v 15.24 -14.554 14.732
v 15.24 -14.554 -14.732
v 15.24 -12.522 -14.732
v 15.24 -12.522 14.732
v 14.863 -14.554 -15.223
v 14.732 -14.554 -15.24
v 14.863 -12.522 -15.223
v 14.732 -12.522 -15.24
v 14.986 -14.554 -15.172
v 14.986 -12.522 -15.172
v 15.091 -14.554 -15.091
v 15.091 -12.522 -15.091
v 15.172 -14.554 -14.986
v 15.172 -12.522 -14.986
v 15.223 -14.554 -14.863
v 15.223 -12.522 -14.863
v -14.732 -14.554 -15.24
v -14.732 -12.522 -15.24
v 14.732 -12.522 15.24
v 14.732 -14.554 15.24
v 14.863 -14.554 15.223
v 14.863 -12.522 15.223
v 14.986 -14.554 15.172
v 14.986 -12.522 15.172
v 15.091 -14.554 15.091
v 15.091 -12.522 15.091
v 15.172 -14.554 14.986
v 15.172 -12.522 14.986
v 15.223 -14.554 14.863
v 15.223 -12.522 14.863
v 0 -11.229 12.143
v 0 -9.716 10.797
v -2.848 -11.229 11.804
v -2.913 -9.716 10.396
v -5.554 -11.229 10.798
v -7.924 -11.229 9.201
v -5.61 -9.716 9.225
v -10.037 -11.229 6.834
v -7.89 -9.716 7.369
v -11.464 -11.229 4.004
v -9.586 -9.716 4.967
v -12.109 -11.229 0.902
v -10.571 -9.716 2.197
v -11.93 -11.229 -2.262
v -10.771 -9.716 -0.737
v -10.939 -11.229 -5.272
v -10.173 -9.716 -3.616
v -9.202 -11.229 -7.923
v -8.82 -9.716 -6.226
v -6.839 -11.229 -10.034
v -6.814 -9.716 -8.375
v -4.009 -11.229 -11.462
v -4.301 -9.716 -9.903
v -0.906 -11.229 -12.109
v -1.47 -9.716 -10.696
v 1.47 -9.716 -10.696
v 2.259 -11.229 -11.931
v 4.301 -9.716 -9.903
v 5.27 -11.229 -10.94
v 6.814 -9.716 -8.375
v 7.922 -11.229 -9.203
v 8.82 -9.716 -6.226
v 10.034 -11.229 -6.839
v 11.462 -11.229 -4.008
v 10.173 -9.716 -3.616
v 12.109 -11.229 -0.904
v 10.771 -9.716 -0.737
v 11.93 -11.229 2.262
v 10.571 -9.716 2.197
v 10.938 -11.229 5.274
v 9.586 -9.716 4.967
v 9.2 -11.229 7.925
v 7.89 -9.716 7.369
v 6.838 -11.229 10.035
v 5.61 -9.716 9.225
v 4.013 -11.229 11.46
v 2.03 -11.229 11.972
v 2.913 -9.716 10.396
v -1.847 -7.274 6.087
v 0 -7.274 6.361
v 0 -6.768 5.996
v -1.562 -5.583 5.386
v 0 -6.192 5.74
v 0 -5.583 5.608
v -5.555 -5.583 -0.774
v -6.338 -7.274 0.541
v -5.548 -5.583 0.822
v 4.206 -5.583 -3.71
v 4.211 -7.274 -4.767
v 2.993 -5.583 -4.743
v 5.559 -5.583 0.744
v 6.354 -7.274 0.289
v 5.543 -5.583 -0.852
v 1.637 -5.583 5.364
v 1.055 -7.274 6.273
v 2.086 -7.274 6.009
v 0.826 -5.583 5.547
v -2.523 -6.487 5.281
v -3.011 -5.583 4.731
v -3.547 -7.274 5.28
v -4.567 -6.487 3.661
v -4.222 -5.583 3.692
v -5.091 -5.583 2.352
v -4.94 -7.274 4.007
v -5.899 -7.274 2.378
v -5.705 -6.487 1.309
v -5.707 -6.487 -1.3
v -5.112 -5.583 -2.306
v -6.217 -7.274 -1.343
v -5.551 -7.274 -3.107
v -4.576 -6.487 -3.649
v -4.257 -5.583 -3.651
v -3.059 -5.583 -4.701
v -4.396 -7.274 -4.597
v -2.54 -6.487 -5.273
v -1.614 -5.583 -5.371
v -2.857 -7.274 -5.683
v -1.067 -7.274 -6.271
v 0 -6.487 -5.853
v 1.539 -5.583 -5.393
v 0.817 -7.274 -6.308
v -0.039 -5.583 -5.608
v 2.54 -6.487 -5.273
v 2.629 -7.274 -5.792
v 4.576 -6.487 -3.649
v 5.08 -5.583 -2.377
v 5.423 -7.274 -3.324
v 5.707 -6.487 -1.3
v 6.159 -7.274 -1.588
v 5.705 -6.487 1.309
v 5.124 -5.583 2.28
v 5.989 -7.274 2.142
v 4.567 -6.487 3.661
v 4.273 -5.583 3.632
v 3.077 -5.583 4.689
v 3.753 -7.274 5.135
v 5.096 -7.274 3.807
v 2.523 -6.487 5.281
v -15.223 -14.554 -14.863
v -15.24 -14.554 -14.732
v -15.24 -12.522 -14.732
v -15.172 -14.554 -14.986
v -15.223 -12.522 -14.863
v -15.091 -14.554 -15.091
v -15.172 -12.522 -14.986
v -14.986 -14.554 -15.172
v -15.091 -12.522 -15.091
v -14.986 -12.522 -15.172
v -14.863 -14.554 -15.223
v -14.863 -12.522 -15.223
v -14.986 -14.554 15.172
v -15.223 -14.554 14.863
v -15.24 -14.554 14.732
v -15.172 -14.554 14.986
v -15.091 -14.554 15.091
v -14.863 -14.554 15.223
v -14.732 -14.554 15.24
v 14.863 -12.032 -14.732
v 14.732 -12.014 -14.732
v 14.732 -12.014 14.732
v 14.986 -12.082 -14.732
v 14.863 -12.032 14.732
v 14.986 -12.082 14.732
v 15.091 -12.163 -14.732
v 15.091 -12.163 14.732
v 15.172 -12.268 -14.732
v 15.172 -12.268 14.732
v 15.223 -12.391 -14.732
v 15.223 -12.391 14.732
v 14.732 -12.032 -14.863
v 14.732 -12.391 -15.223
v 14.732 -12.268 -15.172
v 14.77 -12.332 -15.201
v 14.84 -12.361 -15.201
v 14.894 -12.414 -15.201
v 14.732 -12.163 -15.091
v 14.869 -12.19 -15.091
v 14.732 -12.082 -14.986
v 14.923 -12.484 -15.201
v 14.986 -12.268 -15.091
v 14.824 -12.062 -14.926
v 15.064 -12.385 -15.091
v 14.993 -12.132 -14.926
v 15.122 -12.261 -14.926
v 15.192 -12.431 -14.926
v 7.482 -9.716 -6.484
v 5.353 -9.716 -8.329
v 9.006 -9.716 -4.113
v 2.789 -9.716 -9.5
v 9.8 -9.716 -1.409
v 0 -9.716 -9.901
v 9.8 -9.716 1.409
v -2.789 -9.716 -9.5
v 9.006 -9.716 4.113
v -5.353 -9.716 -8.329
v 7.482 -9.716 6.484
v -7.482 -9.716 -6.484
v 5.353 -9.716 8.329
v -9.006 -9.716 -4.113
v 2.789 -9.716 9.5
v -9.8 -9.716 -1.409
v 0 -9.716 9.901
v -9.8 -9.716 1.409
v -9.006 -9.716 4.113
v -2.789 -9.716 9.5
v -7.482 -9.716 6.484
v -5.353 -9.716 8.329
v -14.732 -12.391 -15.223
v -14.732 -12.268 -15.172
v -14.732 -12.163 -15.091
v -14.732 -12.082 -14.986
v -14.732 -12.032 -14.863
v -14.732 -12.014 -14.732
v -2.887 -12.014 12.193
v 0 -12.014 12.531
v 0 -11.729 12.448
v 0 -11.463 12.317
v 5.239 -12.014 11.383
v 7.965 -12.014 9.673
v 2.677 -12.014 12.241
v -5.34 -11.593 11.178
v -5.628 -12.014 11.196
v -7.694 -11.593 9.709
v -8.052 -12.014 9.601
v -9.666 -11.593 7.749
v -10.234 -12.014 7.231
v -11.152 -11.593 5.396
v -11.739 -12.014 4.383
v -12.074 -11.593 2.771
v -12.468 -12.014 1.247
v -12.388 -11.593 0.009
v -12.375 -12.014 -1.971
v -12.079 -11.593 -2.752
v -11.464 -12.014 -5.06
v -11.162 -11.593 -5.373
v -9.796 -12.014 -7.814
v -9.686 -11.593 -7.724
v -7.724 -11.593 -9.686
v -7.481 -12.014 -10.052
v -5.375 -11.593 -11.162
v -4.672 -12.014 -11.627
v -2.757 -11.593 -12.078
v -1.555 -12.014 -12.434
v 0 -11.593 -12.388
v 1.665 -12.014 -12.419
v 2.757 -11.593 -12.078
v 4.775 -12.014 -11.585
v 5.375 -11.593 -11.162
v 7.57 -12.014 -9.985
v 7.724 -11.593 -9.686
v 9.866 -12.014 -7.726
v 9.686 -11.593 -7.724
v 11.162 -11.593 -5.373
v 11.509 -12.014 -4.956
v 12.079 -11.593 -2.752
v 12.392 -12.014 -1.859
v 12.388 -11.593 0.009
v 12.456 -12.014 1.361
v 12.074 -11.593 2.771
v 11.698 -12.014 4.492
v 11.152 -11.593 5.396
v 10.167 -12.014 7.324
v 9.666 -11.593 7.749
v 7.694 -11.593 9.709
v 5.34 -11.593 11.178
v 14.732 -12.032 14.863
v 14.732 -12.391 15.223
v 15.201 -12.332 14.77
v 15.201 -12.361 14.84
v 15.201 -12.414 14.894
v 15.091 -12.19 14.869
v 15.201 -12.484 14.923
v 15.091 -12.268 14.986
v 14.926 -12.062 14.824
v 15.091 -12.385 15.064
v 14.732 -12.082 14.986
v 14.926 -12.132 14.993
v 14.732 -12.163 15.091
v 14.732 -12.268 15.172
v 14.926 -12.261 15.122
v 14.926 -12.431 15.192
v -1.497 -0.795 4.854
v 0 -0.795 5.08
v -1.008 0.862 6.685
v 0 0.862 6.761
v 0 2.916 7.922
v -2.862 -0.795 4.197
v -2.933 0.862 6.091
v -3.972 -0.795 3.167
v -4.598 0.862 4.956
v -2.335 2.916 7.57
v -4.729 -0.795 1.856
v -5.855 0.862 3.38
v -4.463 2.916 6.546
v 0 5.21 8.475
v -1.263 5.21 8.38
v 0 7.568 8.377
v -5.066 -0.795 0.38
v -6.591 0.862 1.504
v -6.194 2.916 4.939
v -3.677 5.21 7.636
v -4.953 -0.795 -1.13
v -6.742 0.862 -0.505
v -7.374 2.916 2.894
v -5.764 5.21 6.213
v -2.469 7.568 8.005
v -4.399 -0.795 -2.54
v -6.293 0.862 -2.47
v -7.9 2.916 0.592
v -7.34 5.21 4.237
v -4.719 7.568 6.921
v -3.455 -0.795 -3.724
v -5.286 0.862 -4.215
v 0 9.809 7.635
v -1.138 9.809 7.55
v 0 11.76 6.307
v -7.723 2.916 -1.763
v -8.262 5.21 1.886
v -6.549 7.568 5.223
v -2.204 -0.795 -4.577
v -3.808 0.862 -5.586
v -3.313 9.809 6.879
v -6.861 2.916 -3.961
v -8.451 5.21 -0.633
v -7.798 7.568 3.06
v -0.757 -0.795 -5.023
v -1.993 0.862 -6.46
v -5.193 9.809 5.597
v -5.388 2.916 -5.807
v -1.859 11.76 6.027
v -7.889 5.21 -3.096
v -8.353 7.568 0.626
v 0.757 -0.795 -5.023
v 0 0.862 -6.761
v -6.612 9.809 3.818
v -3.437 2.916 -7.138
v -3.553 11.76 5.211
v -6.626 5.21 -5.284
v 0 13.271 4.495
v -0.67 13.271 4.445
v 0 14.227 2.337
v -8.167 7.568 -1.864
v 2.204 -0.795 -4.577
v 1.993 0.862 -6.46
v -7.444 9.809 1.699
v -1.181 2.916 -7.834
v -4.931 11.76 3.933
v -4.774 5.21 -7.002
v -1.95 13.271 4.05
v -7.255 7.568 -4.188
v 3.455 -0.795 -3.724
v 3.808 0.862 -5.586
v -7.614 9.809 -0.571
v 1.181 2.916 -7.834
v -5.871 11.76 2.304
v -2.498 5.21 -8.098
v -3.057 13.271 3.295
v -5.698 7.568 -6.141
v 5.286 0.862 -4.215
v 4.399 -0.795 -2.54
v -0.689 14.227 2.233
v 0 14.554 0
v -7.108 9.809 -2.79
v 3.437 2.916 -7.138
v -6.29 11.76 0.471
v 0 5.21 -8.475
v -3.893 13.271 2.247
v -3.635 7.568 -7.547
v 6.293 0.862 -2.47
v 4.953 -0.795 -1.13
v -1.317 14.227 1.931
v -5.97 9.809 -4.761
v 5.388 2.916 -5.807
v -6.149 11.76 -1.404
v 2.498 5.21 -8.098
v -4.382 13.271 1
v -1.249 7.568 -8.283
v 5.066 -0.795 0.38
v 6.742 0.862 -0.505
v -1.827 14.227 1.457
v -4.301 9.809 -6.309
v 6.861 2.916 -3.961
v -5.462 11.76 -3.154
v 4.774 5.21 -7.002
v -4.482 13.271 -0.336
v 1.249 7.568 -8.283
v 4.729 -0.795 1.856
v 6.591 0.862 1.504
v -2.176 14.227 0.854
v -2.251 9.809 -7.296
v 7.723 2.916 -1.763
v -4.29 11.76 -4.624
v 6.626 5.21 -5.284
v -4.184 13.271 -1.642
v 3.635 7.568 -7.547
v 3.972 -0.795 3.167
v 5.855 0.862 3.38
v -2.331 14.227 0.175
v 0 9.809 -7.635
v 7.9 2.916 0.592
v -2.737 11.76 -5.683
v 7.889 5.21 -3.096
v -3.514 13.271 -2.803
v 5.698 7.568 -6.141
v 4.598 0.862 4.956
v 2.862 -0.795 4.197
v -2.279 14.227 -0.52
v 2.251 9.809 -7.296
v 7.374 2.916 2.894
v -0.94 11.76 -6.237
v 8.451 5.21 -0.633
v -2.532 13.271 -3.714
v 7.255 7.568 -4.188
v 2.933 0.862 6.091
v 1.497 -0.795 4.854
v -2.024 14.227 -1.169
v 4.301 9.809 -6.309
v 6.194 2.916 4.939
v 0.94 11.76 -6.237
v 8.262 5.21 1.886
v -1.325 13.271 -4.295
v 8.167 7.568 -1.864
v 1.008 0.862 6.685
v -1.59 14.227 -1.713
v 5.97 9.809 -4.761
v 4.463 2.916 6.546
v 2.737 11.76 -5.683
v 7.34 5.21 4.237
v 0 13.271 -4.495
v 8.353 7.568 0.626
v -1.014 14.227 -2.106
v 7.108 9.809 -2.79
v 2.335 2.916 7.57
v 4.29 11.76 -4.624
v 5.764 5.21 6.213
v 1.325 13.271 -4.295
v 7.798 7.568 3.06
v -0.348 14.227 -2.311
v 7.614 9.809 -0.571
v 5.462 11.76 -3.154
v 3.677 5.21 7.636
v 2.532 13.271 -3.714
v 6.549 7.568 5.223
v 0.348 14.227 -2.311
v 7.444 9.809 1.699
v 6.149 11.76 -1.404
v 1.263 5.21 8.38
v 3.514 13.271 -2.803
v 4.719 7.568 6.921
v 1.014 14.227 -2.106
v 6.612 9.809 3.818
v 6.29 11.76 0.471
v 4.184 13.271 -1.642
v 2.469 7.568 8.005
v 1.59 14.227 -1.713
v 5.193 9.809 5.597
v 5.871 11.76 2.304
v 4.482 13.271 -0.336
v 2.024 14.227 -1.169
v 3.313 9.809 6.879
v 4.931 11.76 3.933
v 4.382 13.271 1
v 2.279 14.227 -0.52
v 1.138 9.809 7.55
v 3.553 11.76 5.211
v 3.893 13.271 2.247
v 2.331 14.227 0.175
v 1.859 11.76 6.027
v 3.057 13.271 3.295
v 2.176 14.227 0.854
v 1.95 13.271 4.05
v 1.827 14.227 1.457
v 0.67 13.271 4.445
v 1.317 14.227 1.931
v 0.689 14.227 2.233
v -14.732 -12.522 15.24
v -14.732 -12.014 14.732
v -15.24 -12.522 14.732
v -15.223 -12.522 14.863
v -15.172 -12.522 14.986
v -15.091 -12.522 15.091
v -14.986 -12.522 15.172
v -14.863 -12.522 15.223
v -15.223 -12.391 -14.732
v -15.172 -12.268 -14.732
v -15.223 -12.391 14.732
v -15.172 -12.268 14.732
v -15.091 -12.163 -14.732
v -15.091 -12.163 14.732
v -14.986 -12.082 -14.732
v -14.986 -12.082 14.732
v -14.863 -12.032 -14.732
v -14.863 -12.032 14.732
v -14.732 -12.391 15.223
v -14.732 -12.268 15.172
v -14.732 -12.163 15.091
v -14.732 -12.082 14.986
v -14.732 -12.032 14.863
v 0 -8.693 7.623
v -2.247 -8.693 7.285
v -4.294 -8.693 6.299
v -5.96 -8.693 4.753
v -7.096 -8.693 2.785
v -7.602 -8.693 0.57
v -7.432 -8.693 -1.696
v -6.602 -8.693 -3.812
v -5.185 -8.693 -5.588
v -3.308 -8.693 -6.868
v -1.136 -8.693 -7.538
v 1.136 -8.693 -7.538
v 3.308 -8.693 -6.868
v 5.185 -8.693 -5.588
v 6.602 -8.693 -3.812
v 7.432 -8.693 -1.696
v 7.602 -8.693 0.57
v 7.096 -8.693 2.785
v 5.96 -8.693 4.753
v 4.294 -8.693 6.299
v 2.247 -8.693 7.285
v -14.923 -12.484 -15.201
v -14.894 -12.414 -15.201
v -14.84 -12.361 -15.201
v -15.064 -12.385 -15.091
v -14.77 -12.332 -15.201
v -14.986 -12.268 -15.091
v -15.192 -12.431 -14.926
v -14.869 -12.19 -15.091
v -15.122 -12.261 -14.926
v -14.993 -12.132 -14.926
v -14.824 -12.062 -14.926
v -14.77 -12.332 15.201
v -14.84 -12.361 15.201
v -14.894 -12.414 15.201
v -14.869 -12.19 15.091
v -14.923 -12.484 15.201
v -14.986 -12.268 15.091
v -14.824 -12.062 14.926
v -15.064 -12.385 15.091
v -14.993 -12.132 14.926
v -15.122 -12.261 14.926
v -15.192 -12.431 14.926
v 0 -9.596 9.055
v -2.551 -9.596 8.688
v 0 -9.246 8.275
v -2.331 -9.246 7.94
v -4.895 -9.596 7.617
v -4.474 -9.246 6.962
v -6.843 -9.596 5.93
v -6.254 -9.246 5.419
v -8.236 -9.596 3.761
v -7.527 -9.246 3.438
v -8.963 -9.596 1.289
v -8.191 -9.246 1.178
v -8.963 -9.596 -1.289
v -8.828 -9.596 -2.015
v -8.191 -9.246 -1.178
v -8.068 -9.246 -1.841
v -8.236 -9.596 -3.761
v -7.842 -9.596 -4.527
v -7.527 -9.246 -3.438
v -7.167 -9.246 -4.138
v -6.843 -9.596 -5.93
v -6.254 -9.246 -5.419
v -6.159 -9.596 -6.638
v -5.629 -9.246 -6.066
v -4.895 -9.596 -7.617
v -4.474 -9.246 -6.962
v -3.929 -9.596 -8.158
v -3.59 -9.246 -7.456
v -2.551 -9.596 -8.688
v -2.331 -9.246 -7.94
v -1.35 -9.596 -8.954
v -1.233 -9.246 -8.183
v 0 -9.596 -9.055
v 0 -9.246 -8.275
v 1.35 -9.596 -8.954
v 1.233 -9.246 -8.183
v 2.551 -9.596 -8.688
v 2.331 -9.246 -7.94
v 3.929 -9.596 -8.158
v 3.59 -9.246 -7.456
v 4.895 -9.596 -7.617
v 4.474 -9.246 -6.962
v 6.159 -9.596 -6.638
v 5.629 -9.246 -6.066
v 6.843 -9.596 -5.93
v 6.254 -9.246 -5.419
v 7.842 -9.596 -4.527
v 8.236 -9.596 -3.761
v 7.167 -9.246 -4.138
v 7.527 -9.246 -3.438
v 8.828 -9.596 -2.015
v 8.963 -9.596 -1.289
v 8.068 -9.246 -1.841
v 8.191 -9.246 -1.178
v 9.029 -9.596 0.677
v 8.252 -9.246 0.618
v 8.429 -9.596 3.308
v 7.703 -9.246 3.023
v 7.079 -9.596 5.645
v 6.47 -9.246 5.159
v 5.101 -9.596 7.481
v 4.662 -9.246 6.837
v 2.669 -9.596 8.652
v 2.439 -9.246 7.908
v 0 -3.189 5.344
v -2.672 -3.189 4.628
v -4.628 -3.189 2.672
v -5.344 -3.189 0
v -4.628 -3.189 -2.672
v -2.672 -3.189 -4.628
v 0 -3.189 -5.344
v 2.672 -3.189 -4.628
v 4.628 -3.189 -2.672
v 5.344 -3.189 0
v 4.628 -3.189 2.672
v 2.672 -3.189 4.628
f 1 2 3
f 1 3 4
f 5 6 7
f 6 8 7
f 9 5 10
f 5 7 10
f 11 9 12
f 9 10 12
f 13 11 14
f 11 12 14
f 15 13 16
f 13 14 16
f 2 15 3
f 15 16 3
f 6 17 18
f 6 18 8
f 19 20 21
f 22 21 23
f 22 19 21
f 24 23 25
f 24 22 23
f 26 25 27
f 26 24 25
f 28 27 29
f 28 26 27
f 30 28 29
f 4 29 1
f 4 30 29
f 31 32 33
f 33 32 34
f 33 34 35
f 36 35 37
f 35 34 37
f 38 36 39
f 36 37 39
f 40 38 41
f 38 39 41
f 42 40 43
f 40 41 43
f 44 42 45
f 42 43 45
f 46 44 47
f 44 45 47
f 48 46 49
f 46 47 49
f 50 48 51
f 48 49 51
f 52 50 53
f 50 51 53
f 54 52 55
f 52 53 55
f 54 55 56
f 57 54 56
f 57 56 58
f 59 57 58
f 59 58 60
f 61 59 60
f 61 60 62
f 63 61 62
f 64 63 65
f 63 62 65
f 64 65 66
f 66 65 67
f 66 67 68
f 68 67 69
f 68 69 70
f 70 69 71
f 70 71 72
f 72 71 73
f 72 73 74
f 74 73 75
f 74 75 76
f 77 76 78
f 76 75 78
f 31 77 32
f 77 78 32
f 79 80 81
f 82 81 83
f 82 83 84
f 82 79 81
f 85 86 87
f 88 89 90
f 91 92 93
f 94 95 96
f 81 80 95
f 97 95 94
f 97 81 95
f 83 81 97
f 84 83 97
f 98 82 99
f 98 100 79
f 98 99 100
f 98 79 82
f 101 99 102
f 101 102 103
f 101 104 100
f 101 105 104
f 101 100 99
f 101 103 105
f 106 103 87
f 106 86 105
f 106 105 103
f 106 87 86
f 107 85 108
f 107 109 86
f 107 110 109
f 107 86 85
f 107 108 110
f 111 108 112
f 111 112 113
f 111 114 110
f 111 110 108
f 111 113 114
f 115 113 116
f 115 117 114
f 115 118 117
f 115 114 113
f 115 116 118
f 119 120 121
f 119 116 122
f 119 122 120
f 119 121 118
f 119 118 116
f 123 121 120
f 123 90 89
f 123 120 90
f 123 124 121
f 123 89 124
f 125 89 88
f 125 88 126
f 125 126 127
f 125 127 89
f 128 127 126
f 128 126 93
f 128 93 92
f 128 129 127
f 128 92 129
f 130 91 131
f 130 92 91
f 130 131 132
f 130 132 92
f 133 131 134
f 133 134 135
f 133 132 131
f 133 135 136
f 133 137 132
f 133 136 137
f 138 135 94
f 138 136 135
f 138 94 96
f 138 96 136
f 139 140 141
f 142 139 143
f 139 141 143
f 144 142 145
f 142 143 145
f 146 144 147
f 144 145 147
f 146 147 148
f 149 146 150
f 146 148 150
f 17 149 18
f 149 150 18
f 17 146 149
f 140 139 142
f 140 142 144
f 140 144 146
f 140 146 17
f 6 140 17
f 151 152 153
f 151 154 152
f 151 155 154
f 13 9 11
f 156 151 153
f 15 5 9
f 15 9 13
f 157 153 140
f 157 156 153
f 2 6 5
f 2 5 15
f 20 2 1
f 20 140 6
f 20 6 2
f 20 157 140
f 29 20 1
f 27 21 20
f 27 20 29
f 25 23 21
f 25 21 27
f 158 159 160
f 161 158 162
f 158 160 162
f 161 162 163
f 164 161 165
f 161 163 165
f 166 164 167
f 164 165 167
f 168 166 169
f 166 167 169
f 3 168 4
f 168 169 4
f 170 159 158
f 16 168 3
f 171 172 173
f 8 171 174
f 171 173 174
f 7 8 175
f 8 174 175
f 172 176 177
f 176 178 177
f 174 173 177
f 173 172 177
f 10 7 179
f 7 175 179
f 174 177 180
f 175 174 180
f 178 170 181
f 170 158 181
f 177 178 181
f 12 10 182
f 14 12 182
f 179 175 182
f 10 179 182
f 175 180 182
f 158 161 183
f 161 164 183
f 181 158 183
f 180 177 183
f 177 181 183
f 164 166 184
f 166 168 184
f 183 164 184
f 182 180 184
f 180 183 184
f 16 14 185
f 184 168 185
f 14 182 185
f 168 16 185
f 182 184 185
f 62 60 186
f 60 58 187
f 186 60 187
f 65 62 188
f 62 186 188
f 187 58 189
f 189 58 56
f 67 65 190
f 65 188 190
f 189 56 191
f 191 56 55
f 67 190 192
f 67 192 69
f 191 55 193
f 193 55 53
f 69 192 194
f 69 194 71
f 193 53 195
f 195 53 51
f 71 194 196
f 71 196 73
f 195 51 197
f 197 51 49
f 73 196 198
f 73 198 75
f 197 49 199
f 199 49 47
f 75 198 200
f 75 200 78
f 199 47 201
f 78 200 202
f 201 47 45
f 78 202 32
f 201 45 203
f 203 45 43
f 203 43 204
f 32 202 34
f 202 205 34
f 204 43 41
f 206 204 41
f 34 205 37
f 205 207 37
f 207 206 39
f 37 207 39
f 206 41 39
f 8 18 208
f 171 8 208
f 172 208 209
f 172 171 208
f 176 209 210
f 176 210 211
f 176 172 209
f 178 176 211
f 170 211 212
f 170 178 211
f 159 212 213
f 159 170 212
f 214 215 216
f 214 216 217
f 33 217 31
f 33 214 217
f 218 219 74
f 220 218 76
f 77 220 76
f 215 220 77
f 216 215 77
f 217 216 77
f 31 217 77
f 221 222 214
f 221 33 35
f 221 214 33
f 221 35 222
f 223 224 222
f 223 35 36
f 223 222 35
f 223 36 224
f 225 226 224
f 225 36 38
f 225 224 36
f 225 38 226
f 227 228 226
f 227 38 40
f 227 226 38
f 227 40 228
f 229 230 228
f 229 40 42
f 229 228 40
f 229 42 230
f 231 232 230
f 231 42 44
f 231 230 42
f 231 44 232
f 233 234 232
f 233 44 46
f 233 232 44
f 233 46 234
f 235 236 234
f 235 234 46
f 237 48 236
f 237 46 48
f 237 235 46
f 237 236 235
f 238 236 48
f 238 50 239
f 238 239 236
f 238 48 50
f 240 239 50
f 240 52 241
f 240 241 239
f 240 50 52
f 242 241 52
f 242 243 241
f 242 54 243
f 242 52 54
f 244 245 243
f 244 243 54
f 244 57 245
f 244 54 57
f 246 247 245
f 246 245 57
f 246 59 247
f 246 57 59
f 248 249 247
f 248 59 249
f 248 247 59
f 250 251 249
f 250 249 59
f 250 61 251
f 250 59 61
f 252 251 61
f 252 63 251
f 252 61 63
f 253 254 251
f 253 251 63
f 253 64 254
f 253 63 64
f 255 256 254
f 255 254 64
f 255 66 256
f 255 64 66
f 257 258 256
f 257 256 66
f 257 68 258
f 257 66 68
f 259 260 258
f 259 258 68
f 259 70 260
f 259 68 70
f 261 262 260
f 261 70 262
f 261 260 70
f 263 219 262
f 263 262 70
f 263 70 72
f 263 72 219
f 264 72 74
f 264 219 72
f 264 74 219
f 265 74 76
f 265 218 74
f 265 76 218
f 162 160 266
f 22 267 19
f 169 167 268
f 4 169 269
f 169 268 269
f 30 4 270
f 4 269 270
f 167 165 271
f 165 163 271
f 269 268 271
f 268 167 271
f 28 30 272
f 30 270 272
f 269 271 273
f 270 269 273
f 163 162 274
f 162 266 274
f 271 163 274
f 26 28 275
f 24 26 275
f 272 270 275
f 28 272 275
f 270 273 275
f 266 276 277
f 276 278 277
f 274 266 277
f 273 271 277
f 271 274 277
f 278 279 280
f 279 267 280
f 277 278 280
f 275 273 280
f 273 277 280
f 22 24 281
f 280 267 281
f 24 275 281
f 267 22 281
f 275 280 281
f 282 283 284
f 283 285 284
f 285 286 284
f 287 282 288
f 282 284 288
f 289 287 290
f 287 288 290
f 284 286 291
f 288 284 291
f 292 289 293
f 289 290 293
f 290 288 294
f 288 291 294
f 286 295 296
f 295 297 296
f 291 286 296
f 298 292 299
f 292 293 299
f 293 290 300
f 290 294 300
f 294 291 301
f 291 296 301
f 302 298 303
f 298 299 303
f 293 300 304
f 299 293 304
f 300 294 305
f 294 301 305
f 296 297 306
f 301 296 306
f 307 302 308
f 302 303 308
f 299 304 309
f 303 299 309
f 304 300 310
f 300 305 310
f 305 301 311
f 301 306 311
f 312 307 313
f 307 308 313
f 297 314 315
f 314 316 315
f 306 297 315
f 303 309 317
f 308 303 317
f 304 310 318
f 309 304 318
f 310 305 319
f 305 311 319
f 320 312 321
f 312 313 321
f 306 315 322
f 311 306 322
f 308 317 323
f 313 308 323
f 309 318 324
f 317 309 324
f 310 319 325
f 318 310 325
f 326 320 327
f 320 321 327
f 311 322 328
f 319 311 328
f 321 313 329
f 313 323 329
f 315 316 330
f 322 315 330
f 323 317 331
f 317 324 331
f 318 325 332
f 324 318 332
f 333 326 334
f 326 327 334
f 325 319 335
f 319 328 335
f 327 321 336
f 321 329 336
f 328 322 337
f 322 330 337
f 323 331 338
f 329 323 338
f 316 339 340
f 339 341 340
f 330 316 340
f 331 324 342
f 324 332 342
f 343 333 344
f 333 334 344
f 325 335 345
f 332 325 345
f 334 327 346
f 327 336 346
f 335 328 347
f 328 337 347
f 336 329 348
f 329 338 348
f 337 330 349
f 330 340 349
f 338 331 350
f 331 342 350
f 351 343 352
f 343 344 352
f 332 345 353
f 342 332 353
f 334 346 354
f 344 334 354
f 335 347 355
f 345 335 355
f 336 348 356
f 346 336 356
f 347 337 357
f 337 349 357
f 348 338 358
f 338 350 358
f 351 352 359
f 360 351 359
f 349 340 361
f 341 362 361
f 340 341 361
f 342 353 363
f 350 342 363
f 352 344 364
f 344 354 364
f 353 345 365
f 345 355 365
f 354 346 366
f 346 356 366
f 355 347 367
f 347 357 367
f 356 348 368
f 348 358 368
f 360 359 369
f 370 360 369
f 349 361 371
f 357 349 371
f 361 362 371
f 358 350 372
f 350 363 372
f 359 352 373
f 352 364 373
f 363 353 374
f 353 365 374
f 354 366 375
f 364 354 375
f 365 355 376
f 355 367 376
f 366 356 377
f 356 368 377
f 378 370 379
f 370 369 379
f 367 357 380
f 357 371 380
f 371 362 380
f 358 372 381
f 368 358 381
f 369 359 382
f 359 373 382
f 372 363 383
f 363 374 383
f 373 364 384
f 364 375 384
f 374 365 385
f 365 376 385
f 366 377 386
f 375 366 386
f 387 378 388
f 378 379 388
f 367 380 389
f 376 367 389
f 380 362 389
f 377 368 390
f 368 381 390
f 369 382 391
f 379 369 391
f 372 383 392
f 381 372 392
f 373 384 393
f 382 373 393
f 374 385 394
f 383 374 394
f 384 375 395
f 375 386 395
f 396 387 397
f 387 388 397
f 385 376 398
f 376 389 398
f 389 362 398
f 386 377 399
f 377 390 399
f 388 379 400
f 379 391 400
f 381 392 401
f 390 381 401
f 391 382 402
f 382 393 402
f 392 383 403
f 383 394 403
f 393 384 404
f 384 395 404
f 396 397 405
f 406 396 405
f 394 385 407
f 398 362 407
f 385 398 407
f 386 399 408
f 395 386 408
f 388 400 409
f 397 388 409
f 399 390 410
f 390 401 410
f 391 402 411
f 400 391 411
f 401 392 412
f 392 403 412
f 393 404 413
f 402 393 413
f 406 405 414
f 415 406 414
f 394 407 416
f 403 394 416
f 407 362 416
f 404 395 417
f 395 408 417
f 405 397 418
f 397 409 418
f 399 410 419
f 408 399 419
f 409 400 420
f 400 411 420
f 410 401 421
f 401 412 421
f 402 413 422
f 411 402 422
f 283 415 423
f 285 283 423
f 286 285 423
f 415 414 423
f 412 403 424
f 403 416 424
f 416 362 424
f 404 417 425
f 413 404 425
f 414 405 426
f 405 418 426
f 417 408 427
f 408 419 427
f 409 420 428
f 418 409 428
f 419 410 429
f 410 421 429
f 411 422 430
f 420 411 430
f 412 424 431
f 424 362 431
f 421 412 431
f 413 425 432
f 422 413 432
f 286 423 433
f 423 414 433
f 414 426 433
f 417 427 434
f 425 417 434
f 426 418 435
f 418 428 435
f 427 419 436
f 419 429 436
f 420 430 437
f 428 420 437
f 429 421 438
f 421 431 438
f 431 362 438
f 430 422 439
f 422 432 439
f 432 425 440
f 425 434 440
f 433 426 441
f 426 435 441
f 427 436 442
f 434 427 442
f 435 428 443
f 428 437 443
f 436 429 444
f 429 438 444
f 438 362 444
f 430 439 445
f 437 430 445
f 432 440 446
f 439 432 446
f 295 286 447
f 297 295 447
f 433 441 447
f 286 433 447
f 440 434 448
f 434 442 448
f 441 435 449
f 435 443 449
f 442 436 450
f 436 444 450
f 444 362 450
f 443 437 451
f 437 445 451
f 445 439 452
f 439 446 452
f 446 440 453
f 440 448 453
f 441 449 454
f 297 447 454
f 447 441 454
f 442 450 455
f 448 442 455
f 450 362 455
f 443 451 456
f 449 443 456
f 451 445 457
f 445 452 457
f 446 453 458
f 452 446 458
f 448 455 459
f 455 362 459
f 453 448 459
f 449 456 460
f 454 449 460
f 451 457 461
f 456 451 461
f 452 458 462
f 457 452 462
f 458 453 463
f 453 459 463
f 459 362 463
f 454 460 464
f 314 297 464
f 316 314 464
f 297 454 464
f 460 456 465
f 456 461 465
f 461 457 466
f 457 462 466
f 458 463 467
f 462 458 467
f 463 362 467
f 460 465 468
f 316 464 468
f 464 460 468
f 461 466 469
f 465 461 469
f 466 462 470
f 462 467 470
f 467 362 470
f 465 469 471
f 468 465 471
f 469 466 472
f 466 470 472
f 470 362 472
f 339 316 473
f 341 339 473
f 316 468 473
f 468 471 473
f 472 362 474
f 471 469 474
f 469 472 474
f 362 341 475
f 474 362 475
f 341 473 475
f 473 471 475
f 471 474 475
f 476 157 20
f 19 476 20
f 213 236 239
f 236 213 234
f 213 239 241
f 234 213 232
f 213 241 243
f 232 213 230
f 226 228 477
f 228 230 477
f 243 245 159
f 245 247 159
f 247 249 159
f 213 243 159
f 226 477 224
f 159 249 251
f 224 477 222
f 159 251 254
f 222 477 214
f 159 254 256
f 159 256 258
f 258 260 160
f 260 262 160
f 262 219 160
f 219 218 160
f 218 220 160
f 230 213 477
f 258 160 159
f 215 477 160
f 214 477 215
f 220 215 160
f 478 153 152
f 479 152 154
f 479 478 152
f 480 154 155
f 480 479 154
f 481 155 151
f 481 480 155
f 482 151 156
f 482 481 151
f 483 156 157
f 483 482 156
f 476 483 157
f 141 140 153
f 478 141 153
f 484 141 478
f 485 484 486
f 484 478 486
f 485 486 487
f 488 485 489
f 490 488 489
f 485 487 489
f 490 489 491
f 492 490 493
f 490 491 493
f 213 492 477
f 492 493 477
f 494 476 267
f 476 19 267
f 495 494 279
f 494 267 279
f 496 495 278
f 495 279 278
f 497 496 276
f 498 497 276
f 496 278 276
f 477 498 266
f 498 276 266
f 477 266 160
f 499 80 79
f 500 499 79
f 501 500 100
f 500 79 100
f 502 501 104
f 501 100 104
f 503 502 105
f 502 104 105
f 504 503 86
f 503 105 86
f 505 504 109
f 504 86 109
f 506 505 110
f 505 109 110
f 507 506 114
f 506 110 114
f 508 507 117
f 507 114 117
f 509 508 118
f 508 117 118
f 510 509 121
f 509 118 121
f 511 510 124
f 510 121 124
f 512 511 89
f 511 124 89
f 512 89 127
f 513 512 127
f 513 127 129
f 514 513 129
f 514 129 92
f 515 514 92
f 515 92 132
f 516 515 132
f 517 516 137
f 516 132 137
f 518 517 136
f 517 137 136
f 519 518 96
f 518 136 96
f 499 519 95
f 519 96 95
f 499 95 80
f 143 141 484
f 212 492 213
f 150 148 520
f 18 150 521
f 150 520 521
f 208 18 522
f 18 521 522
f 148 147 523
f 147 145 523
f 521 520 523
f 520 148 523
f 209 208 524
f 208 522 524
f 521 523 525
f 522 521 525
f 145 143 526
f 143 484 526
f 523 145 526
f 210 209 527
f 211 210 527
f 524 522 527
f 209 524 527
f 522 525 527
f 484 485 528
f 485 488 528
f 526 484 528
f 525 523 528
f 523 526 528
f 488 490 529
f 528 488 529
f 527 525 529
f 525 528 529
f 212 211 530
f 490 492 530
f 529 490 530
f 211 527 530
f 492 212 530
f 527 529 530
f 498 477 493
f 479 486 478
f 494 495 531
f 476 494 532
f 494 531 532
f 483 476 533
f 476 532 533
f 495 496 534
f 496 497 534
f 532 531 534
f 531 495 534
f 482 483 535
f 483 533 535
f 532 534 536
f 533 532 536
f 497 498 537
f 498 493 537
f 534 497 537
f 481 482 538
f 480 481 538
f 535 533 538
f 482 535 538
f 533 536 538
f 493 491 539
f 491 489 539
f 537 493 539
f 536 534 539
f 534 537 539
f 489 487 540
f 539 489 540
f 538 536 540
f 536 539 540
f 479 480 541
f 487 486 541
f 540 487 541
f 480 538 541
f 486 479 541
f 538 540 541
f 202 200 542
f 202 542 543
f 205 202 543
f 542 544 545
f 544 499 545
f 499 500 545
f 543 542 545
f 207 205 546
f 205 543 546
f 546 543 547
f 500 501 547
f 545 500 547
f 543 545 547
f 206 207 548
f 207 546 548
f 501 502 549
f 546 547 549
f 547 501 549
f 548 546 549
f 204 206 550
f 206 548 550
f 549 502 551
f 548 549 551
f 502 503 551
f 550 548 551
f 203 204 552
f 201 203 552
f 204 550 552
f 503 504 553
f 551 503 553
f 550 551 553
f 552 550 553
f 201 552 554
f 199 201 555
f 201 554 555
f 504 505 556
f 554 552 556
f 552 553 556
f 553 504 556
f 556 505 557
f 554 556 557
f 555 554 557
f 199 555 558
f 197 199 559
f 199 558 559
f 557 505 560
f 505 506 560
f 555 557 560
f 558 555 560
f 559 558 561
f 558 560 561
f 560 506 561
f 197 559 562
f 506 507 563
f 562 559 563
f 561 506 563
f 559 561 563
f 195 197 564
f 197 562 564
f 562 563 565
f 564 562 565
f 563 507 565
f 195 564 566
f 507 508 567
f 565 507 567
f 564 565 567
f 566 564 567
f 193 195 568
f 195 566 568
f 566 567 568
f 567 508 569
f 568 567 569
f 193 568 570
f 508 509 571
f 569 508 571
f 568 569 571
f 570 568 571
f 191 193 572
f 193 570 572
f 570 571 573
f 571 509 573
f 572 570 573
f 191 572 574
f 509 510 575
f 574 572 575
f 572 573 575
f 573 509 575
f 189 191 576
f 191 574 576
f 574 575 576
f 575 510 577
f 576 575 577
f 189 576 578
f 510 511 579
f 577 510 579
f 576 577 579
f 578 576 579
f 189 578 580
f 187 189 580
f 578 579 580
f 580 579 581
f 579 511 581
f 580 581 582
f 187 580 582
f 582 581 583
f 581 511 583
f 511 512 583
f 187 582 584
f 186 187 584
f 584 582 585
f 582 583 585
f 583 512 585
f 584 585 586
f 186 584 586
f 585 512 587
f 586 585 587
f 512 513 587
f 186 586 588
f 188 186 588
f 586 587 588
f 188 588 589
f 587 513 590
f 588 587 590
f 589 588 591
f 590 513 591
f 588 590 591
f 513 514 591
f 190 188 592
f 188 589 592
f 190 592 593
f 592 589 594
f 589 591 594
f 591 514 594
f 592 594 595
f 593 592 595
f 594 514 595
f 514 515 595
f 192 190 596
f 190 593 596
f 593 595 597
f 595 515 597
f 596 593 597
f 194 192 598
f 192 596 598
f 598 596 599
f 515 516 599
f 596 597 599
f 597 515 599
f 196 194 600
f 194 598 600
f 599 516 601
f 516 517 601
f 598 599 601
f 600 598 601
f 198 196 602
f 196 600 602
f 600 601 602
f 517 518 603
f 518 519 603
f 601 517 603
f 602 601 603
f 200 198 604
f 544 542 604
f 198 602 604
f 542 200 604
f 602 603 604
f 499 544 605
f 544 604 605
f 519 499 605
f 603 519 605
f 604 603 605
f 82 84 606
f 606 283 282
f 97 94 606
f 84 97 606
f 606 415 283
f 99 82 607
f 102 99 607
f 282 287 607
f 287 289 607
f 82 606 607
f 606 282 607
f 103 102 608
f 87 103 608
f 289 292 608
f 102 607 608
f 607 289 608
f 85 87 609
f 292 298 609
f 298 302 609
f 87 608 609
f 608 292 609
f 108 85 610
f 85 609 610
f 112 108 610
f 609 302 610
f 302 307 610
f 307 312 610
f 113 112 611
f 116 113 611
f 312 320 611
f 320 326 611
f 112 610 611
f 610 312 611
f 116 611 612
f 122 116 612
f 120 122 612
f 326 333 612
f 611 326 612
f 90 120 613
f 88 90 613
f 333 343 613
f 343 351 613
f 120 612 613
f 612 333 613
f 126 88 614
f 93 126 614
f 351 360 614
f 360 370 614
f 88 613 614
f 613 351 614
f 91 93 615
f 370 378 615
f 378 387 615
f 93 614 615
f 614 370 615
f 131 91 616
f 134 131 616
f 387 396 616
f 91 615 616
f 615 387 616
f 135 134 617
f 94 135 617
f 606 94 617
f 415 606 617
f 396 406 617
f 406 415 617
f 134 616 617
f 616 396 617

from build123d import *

# Parameters (mm, degrees)
FILLET1_R           = 1.651
FILLET2_R           = 3.048
SKETCH2_W           = 30.48
SKETCH2_H           = 30.48
BOSS_EXTRUDE1_DEPTH = 2.54
FILLET3_R           = 0.508


with BuildPart() as part:
    # Sketch1 → Revolve1 (revolve)
    with BuildSketch(Plane(origin=(0, 0, 0), x_dir=(0, 0, -1), z_dir=(1, 0, 0)), mode=Mode.PRIVATE) as revolve1_sk:
        with BuildLine():
            Line((0, 14.5542), (0, -14.5542))
            Line((0, -14.5542), (12.5603, -14.5542))
            Line((12.5603, -14.5542), (12.5603, -11.698058268))
            Line((12.5603, -11.698058268), (10.796510879, -9.7155))
            Line((10.796510879, -9.7155), (8.532673765, -9.7155))
            Line((8.532673765, -9.7155), (5.715, -6.548339963))
            Line((5.715, -6.548339963), (5.08, -0.795239963))
            ThreePointArc((5.08, -0.795239963), (8.084115709, 8.714342259), (0, 14.5542))
        make_face()
    revolve(revolve1_sk.sketch.rotate(Axis((0, 14.5542, 0), (0, -1, 0)), 180), axis=Axis((0, 14.5542, 0), (0, -1, 0)))

    # Fillet1
    fillet1_edges = [part.edges().sort_by_distance(p)[0] for p in [
        (0, -14.5542, -12.5603),
        (0, -11.698058268, -12.5603),
    ]]
    fillet(fillet1_edges, radius=FILLET1_R)

    # Fillet2
    fillet2_edges = [part.edges().sort_by_distance(p)[0] for p in [
        (0, -9.7155, -8.532673765),
        (0, -6.548339963, -5.715),
    ]]
    fillet(fillet2_edges, radius=FILLET2_R)

    # Sketch2 → Boss-Extrude1 (add)
    with BuildSketch(Plane.XZ.offset(14.5542)):
        Rectangle(SKETCH2_W, SKETCH2_H)
    extrude(amount=-BOSS_EXTRUDE1_DEPTH)

    # Fillet3
    fillet3_edges = [part.edges().sort_by_distance(p)[0] for p in [
        (-15.24, -12.0142, 0),
        (-15.24, -13.2842, -15.24),
        (0, -12.0142, 15.24),
        (-15.24, -13.2842, 15.24),
        (15.24, -12.0142, 0),
        (15.24, -13.2842, 15.24),
        (0, -12.0142, -15.24),
        (15.24, -13.2842, -15.24),
    ]]
    fillet(fillet3_edges, radius=FILLET3_R)


solid = part.part
